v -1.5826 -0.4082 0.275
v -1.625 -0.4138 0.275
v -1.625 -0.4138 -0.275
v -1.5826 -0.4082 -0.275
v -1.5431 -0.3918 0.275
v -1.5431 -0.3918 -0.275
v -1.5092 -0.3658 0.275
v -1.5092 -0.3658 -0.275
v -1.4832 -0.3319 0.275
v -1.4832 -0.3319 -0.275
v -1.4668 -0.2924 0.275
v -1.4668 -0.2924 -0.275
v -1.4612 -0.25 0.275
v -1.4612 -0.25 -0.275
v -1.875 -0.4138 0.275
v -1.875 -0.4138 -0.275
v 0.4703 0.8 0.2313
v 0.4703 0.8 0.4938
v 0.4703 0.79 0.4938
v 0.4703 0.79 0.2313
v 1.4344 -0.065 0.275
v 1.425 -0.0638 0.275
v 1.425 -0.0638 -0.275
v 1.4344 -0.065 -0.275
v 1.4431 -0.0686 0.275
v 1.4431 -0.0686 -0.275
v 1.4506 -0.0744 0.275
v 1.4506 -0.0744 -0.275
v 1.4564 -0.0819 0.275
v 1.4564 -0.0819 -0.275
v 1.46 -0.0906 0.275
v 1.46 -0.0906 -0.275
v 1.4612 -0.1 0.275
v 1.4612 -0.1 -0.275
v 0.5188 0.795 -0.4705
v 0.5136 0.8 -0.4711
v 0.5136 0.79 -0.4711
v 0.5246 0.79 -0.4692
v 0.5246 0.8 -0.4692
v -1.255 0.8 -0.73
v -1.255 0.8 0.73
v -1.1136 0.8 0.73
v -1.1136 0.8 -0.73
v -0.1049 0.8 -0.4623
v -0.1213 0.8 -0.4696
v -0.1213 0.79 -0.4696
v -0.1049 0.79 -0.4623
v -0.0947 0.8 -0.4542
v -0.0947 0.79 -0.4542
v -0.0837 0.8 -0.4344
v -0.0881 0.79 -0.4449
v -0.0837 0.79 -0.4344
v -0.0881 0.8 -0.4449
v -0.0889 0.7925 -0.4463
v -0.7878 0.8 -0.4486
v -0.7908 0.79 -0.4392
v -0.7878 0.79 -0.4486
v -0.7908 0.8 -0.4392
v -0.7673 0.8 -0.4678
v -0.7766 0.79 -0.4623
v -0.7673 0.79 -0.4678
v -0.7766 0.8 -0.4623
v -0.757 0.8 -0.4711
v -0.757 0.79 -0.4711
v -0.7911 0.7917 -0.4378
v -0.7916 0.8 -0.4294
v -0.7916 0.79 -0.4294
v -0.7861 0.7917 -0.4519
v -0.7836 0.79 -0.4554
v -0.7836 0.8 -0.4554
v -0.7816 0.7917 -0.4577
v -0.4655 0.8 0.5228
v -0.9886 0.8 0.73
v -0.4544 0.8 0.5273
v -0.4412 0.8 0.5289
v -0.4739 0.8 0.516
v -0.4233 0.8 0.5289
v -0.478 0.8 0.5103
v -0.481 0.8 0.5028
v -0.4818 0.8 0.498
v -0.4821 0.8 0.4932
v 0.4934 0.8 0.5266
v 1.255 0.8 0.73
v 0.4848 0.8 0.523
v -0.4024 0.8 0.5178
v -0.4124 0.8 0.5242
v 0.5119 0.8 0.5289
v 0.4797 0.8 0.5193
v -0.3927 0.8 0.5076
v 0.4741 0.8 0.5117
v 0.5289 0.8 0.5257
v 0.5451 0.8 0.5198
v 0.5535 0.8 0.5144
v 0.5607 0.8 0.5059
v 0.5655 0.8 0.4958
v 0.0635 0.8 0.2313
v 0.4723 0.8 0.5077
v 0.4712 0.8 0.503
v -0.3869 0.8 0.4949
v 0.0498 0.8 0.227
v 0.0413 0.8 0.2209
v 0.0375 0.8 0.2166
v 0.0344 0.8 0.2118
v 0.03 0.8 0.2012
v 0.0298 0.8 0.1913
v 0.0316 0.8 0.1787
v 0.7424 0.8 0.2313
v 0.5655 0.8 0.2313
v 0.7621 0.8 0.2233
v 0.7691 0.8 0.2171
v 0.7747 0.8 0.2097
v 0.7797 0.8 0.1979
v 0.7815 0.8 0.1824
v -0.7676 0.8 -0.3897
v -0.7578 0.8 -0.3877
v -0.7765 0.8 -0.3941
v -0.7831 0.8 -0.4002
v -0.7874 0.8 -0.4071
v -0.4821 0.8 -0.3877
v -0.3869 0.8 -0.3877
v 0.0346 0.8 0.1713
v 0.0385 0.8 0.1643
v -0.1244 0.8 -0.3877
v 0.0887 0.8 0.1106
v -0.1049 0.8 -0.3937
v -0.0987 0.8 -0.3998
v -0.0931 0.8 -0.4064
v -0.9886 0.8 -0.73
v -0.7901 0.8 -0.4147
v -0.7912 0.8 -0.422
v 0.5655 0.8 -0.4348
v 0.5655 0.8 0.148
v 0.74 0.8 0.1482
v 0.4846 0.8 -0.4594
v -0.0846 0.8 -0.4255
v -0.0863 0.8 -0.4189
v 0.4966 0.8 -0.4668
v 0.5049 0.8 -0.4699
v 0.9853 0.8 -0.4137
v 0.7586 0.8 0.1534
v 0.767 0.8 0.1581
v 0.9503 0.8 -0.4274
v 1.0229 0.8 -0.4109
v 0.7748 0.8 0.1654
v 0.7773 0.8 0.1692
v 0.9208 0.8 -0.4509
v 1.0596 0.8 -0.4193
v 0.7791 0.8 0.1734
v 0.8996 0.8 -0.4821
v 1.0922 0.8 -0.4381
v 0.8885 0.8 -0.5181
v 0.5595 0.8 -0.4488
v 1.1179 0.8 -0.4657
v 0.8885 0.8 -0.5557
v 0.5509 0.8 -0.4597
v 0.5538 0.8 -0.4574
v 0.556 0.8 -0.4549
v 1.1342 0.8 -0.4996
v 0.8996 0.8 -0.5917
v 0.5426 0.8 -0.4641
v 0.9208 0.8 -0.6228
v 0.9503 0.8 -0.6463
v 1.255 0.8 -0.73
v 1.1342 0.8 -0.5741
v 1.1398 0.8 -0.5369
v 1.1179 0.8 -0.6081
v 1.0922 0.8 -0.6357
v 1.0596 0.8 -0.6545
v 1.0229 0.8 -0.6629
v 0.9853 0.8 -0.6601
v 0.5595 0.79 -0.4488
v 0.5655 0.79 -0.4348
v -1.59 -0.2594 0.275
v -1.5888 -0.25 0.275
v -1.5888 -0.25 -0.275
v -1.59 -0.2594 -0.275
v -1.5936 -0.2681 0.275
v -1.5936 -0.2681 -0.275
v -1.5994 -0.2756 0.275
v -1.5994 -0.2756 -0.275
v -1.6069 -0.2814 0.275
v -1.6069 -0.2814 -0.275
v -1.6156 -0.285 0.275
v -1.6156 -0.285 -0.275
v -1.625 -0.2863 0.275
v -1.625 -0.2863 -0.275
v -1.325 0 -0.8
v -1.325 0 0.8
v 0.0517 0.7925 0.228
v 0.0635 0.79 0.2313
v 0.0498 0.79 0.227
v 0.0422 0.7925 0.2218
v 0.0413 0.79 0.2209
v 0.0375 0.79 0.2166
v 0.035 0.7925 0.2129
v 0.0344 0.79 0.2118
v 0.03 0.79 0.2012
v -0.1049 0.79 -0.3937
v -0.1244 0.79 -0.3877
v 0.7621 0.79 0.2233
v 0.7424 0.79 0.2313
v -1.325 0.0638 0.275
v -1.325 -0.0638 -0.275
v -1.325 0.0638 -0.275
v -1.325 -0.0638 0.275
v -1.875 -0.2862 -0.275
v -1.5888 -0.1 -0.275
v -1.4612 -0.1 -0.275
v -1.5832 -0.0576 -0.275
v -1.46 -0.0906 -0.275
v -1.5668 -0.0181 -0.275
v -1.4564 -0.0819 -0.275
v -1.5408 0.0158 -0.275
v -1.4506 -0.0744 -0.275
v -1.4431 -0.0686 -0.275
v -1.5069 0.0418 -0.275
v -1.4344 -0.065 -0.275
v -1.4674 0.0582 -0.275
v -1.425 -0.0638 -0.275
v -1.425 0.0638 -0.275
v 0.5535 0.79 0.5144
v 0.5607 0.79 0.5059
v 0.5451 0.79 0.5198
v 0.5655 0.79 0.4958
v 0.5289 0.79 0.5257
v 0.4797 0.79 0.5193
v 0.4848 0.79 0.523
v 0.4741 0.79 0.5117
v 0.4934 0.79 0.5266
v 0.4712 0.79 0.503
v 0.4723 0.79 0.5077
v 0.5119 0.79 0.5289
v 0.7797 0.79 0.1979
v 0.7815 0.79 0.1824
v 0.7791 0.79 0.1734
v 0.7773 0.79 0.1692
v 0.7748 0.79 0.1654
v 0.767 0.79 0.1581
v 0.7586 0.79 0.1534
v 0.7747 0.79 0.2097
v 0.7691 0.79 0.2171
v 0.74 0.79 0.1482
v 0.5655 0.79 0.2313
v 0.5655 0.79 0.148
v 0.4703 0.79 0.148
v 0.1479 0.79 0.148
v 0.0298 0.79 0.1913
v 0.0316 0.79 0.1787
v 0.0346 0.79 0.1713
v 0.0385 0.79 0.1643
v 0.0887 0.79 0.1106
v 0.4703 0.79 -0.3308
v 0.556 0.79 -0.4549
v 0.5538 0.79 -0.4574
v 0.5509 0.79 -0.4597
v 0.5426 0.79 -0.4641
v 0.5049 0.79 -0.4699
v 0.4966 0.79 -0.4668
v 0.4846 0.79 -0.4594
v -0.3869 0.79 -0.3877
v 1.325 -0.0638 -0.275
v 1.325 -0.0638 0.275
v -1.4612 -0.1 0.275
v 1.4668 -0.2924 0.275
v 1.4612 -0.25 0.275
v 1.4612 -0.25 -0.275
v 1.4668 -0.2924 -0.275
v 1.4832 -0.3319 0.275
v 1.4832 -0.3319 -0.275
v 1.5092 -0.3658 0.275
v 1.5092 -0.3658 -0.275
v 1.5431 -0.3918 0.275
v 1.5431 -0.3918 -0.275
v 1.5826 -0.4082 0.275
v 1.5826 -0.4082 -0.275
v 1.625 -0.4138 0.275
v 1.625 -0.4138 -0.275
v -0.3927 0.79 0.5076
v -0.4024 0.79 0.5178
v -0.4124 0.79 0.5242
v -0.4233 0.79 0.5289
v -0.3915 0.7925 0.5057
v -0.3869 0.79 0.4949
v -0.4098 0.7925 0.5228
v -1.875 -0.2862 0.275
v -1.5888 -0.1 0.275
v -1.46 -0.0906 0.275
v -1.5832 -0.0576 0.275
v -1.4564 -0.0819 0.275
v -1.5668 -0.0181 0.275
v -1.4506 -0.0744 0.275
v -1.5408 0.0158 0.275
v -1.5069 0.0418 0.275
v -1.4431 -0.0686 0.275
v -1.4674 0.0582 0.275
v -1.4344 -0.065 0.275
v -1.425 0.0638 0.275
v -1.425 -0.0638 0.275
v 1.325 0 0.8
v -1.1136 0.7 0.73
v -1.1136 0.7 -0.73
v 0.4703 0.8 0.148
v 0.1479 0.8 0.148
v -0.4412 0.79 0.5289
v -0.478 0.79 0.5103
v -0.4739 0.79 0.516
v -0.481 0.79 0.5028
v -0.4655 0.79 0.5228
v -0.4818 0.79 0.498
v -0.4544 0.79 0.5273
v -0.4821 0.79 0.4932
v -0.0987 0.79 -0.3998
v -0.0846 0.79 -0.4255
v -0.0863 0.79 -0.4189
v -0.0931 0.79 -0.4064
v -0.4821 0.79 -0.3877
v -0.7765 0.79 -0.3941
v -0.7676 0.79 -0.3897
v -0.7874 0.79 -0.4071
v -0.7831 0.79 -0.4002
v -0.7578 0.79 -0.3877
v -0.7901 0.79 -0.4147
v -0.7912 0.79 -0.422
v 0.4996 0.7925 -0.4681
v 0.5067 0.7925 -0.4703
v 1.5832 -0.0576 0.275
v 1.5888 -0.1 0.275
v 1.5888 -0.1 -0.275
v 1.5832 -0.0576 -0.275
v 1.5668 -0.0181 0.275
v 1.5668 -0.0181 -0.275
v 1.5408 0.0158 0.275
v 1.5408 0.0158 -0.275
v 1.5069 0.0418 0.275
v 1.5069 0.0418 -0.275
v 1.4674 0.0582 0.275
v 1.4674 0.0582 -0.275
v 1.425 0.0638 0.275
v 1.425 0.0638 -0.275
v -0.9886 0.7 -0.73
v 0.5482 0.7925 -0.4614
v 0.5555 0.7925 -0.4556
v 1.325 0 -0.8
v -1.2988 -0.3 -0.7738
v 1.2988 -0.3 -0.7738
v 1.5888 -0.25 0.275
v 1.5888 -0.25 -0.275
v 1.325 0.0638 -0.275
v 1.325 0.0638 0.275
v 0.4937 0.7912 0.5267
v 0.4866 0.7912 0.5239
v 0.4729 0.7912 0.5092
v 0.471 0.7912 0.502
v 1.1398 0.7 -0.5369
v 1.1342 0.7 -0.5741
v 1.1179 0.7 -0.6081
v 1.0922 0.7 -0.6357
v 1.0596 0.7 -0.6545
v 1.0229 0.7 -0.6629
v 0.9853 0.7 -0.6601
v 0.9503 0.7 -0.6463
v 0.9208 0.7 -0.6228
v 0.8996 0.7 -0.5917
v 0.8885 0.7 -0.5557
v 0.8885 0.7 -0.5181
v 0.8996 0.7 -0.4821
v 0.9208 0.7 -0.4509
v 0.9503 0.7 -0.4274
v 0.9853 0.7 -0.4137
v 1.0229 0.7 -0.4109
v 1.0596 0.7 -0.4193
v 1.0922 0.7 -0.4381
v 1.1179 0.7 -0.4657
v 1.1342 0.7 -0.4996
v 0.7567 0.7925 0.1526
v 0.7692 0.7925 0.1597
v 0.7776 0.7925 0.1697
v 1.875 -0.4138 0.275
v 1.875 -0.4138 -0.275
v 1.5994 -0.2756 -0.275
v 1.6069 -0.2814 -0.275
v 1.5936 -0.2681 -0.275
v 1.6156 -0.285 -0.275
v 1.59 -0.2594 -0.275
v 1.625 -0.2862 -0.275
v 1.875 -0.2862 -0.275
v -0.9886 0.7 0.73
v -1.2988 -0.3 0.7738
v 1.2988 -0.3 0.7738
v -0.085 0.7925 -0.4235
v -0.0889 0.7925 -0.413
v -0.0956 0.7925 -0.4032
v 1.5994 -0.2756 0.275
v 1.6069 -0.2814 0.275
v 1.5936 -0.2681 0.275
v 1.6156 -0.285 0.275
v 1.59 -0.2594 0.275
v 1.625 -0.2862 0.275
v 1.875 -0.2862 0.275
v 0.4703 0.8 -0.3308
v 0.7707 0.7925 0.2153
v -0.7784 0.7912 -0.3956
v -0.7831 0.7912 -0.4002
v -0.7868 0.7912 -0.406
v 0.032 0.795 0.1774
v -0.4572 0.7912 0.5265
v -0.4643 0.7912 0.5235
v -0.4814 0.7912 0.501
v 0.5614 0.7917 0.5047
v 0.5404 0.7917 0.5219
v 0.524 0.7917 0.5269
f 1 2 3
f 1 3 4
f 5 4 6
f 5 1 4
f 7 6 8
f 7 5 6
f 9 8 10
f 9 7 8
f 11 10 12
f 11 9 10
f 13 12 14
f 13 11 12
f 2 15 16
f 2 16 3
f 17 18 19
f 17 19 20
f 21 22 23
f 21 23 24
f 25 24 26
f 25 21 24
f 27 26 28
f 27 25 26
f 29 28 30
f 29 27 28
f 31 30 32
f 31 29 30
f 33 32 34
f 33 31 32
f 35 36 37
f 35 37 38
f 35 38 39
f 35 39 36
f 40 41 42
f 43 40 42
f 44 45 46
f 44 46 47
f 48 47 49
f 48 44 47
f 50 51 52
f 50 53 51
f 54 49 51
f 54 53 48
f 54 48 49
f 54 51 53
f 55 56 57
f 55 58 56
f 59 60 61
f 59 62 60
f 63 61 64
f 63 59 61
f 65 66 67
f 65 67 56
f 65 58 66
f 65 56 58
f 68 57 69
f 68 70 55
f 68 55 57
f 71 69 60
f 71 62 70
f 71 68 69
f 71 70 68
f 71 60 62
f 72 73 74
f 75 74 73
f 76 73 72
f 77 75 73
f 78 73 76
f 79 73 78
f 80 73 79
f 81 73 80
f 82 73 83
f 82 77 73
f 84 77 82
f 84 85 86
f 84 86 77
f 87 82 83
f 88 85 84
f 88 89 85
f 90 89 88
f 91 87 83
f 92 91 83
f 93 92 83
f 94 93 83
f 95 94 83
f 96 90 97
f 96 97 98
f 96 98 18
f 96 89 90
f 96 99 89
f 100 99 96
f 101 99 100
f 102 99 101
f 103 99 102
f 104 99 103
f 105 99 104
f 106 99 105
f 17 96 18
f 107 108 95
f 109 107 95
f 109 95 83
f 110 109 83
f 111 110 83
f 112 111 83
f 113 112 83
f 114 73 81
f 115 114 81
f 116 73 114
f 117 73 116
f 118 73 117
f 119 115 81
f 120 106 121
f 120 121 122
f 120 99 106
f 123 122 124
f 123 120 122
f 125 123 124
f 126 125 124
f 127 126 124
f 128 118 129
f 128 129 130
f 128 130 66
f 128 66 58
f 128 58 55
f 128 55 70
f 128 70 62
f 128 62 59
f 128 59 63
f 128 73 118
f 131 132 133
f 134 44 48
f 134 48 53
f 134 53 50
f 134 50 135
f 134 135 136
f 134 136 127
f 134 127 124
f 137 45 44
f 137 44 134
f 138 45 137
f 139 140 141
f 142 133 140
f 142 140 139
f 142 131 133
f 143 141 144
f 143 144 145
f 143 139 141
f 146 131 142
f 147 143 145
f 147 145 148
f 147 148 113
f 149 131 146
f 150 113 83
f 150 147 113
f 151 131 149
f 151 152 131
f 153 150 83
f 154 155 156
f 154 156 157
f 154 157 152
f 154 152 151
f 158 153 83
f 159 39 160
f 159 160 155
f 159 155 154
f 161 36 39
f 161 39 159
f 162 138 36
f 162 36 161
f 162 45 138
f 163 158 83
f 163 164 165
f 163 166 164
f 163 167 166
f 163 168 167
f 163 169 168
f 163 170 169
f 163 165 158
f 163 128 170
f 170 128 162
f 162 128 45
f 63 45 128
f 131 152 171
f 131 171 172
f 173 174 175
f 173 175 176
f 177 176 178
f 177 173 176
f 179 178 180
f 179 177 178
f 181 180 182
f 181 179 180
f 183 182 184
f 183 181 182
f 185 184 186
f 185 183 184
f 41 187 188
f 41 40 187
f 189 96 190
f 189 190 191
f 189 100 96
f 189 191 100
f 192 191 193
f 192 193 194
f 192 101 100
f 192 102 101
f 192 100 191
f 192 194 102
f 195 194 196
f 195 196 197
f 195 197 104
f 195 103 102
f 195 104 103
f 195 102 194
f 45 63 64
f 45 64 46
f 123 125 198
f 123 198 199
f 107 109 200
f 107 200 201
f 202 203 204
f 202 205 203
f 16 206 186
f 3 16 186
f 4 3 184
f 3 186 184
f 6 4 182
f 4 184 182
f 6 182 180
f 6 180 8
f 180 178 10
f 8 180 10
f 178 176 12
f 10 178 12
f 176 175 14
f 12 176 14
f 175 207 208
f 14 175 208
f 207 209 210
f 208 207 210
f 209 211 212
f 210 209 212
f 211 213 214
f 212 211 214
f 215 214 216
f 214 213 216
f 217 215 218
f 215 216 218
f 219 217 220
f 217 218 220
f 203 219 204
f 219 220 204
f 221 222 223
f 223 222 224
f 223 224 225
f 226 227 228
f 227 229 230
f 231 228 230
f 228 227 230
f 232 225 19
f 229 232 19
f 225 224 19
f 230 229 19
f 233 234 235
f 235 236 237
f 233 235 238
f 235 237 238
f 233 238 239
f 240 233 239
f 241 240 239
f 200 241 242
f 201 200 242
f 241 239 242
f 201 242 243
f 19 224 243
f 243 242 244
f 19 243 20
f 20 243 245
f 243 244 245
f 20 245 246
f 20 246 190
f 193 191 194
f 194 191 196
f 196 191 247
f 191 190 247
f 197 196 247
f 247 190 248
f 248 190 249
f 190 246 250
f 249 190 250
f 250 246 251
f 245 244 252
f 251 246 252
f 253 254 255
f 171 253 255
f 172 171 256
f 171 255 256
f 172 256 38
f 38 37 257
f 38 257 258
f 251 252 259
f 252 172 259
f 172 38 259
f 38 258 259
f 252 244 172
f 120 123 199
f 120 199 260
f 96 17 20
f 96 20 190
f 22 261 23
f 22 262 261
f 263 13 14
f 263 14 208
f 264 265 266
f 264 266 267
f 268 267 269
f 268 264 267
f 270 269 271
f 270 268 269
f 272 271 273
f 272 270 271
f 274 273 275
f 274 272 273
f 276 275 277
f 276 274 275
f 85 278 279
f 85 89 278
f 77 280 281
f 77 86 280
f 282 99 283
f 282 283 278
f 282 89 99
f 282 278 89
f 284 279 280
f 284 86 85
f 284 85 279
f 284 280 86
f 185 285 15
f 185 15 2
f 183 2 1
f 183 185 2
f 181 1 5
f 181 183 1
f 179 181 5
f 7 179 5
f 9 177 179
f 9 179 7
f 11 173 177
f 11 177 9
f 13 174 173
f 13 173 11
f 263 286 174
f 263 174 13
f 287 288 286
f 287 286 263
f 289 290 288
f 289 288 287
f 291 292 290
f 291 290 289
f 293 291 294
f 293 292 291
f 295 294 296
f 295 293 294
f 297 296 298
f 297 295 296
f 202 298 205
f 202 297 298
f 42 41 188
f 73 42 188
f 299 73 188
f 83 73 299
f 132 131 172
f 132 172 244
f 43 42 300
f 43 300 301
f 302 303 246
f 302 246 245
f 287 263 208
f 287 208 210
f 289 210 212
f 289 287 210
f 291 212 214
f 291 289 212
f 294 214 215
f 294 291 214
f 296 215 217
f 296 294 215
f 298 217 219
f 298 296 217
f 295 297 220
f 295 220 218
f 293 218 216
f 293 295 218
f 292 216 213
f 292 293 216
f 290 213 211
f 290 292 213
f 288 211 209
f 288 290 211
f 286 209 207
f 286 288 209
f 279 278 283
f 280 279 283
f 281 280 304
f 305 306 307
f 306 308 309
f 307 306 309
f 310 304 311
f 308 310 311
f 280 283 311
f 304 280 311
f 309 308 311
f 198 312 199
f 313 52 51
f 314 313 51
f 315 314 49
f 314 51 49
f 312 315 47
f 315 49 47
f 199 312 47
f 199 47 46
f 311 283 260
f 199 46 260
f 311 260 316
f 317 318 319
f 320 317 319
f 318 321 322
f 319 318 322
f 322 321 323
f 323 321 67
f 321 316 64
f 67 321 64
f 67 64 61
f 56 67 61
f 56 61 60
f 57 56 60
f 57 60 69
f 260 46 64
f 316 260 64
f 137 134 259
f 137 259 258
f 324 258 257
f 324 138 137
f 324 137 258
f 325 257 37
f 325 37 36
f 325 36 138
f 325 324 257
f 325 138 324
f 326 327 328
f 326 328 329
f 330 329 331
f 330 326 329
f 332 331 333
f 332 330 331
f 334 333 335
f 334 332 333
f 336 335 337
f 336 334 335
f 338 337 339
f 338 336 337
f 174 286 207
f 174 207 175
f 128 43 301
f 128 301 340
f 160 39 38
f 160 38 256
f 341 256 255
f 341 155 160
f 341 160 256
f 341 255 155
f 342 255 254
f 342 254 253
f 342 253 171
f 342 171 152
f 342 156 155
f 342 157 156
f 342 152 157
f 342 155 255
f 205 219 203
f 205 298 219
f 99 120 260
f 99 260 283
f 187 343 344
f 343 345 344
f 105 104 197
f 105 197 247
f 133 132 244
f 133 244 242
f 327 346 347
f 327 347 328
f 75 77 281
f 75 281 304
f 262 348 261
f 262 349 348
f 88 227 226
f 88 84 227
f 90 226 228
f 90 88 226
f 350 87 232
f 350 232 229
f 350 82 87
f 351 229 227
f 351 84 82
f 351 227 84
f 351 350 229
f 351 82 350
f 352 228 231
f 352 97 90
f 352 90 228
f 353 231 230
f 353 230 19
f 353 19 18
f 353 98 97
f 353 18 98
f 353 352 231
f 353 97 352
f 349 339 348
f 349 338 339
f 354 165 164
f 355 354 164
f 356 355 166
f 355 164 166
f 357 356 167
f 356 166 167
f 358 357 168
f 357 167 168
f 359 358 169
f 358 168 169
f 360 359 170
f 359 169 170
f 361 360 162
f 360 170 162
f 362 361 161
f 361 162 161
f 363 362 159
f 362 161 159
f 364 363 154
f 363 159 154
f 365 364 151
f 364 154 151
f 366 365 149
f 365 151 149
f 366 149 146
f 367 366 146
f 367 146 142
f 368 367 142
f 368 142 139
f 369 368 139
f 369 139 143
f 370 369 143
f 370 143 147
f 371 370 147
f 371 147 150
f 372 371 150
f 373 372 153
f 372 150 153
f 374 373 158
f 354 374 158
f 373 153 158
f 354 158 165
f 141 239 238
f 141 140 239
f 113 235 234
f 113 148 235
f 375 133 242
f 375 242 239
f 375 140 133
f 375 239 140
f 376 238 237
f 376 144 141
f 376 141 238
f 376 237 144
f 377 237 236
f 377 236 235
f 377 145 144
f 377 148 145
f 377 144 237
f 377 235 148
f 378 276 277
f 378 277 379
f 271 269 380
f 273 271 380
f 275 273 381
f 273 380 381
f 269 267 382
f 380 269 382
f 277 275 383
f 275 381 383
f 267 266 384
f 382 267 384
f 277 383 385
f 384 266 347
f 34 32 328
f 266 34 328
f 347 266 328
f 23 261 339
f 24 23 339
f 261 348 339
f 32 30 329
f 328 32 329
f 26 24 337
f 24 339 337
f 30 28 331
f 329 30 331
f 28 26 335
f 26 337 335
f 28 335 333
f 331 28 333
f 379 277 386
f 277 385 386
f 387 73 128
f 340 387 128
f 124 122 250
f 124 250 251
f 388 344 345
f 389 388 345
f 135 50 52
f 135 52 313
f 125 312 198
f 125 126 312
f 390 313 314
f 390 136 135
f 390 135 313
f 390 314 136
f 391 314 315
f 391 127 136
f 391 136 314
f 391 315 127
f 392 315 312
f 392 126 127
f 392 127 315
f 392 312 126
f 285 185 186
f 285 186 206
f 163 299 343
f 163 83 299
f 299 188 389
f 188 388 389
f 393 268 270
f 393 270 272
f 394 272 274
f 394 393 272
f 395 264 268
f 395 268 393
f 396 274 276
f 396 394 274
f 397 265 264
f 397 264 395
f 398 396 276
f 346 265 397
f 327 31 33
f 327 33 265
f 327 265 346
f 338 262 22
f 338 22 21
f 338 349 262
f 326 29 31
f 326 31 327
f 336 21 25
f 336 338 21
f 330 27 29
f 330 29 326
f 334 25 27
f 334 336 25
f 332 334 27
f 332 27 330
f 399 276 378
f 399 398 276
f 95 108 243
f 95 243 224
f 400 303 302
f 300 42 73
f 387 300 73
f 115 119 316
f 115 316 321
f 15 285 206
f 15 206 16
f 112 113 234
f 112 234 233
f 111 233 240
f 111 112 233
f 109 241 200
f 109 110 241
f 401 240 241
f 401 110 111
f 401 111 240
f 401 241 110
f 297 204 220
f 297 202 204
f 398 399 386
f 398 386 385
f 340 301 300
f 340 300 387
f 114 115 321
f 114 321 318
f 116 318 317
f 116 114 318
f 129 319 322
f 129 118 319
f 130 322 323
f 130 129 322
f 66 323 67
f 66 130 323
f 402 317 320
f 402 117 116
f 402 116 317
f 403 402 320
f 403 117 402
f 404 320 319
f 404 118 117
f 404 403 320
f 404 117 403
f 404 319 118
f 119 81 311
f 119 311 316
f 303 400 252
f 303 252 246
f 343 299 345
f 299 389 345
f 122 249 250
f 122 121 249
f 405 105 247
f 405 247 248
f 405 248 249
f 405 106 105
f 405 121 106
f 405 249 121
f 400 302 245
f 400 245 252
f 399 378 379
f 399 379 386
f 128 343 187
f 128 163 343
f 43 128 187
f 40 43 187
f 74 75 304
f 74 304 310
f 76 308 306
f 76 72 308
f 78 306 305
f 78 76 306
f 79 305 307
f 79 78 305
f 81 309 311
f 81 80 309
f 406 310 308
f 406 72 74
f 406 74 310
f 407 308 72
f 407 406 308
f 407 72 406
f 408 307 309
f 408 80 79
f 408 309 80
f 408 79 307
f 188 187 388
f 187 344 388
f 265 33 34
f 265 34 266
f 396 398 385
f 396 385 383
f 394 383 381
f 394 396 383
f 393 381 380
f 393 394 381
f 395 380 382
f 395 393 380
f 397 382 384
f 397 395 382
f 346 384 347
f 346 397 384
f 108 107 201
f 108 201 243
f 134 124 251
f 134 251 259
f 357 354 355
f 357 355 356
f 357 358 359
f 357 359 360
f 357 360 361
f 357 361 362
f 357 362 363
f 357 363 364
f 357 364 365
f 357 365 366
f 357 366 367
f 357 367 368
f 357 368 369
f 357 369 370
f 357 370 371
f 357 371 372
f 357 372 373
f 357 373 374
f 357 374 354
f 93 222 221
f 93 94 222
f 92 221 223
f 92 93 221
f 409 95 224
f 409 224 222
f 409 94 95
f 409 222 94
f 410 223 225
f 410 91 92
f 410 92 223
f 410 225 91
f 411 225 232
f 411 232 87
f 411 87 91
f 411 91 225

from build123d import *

# Parameters (mm, degrees)
SKETCH1_W                     = 2.65
SKETCH1_H                     = 1.6
BOSS_EXTRUDE1_DEPTH           = 0.8
BOSS_EXTRUDE1_TAPER           = 5
BOSS_EXTRUDE1_OTHER_WAY_DEPTH = 0.3
BOSS_EXTRUDE1_OTHER_WAY_TAPER = 5
EXTRUDE_THIN1_DEPTH           = 0.275
EXTRUDE_THIN1_2_DEPTH         = 0.275
CUT_EXTRUDE2_DEPTH            = 0.01
SKETCH5_R                     = 0.126365502
SKETCH5_R_2                   = 0.001365502
SKETCH5_W                     = 0.125
SKETCH5_H                     = 1.460018138
CUT_EXTRUDE_THIN1_DEPTH       = 0.1
CUT_EXTRUDE3_START            = 0.1
SKETCH6_R                     = 0.126365502
CUT_EXTRUDE3_DEPTH            = 0.1


with BuildPart() as part:
    # Sketch1 → Boss-Extrude1 (new body)
    with BuildSketch(Plane(origin=(0, 0, 0), x_dir=(1, 0, 0), z_dir=(0, 1, 0))):
        Rectangle(SKETCH1_W, SKETCH1_H)
    extrude(amount=BOSS_EXTRUDE1_DEPTH, taper=BOSS_EXTRUDE1_TAPER)

    # Sketch1 → Boss-Extrude1 other way (add)
    with BuildSketch(Plane(origin=(0, 0, 0), x_dir=(1, 0, 0), z_dir=(0, 1, 0))):
        Rectangle(SKETCH1_W, SKETCH1_H)
    extrude(amount=-BOSS_EXTRUDE1_OTHER_WAY_DEPTH, taper=BOSS_EXTRUDE1_OTHER_WAY_TAPER)

    # Sketch4 → Cut-Extrude2 (cut)
    # profile 1 of 2: a face of its own
    with BuildSketch(Plane(origin=(0, 0.8, 0), x_dir=(1, 0, 0), z_dir=(0, 1, 0))):
        with BuildLine():
            add(Edge.make_bspline(
                [(-0.121259144, 0.469586956), (-0.116651049, 0.467844685), (-0.107868449, 0.464524077), (-0.096447003, 0.45688116), (-0.088228357, 0.446516989), (-0.08521559, 0.438502857), (-0.083684739, 0.434430706)],
                knots=[0, 0, 0, 0, 1.099088096, 2.094759837, 3.031906972, 4, 4, 4, 4], degree=3))
            add(Edge.make_bspline(
                [(-0.083684739, 0.434430706), (-0.083934775, 0.43073761), (-0.084436505, 0.423326914), (-0.088624873, 0.412581115), (-0.095560362, 0.402540493), (-0.101669699, 0.396747659), (-0.104890096, 0.393694099)],
                knots=[0, 0, 0, 0, 0.933029919, 1.872250689, 2.878405478, 4, 4, 4, 4], degree=3))
            Line((-0.104890096, 0.393694099), (-0.124421346, 0.387741718))
            Line((-0.124421346, 0.387741718), (-0.386884144, 0.387741718))
            Line((-0.386884144, 0.387741718), (-0.386884144, -0.49488477))
            add(Edge.make_bspline(
                [(-0.386884144, -0.49488477), (-0.388226292, -0.49859483), (-0.390942509, -0.506103187), (-0.399133778, -0.515597253), (-0.40998304, -0.523599476), (-0.41870988, -0.527078256), (-0.423342477, -0.528924949)],
                knots=[0, 0, 0, 0, 0.906362302, 1.834280943, 2.850339336, 4, 4, 4, 4], degree=3))
            Line((-0.423342477, -0.528924949), (-0.44119962, -0.528924949))
            add(Edge.make_bspline(
                [(-0.44119962, -0.528924949), (-0.444004378, -0.528847963), (-0.449433668, -0.52869894), (-0.457185821, -0.526675103), (-0.464367422, -0.523841595), (-0.470465169, -0.519397714), (-0.475861843, -0.514357665), (-0.479352362, -0.507937944), (-0.481770348, -0.500885757), (-0.482001809, -0.495837361), (-0.482122239, -0.493210663)],
                knots=[0, 0, 0, 0, 1.101604685, 2.132423317, 3.139528337, 4.122044172, 5.089259853, 6.019369827, 6.969470802, 8, 8, 8, 8], degree=3))
            Line((-0.482122239, -0.493210663), (-0.482122239, 0.387741718))
            Line((-0.482122239, 0.387741718), (-0.757791882, 0.387741718))
            add(Edge.make_bspline(
                [(-0.757791882, 0.387741718), (-0.760480095, 0.388139413), (-0.765599748, 0.388896816), (-0.772640762, 0.391533578), (-0.778512088, 0.39530747), (-0.78335361, 0.400120388), (-0.787028717, 0.406002849), (-0.789960319, 0.412802663), (-0.791300872, 0.420801867), (-0.791526569, 0.426429317), (-0.791646049, 0.429408385)],
                knots=[0, 0, 0, 0, 1.08569211, 2.067680532, 2.983433341, 3.861048676, 4.776801484, 5.744887181, 6.80618505, 8, 8, 8, 8], degree=3))
            add(Edge.make_bspline(
                [(-0.791646049, 0.429408385), (-0.791584577, 0.432216594), (-0.791465245, 0.437668011), (-0.789266612, 0.445222233), (-0.786331556, 0.452128753), (-0.780251927, 0.459630268), (-0.770755063, 0.46725123), (-0.7615821, 0.469810155), (-0.757047834, 0.471075051)],
                knots=[0, 0, 0, 0, 0.852234277, 1.654394119, 2.381606146, 3.12243938, 4.577599788, 6, 6, 6, 6], degree=3))
            Line((-0.757047834, 0.471075051), (-0.121259144, 0.469586956))
        make_face()
    # profile 2 of 2: a face of its own
    with BuildSketch(Plane(origin=(0, 0.8, 0), x_dir=(1, 0, 0), z_dir=(0, 1, 0))):
        with BuildLine():
            Line((0.559544427, 0.448753623), (0.565496808, 0.43480273))
            Line((0.565496808, 0.43480273), (0.565496808, -0.147972568))
            Line((0.565496808, -0.147972568), (0.739975975, -0.14815858))
            add(Edge.make_bspline(
                [(0.739975975, -0.14815858), (0.745651472, -0.149356199), (0.756020301, -0.151544184), (0.769326, -0.158746004), (0.778601366, -0.169323965), (0.780500952, -0.178013221), (0.78145663, -0.18238477)],
                knots=[0, 0, 0, 0, 1.195577152, 2.184255469, 3.086502086, 4, 4, 4, 4], degree=3))
            add(Edge.make_bspline(
                [(0.78145663, -0.18238477), (0.781277252, -0.186567234), (0.780932587, -0.194603608), (0.777289425, -0.205957787), (0.771003906, -0.215812092), (0.765110859, -0.220779207), (0.762111392, -0.223307389)],
                knots=[0, 0, 0, 0, 1.063672196, 2.043787557, 3.004319249, 4, 4, 4, 4], degree=3))
            Line((0.762111392, -0.223307389), (0.74239413, -0.231305901))
            Line((0.74239413, -0.231305901), (0.565496808, -0.231305901))
            Line((0.565496808, -0.231305901), (0.565496808, -0.49581483))
            add(Edge.make_bspline(
                [(0.565496808, -0.49581483), (0.564260881, -0.498858107), (0.561887363, -0.504702527), (0.556262169, -0.51227222), (0.549055395, -0.518201234), (0.538078827, -0.522993434), (0.525678055, -0.526912801), (0.51597471, -0.528332493), (0.51192538, -0.528924949)],
                knots=[0, 0, 0, 0, 0.881479644, 1.692825178, 2.511522639, 3.362763725, 4.899447501, 6, 6, 6, 6], degree=3))
            add(Edge.make_bspline(
                [(0.51192538, -0.528924949), (0.508696109, -0.528823882), (0.502560844, -0.528631867), (0.493970227, -0.527060979), (0.486741308, -0.524145691), (0.480488563, -0.520558484), (0.47603653, -0.515232589), (0.472434762, -0.509147727), (0.470757032, -0.501724154), (0.470429882, -0.496501331), (0.470258713, -0.493768699)],
                knots=[0, 0, 0, 0, 1.244483934, 2.364384402, 3.340480475, 4.242091871, 5.105208837, 5.982430491, 6.944388035, 8, 8, 8, 8], degree=3))
            Line((0.470258713, -0.493768699), (0.470258713, -0.231305901))
            Line((0.470258713, -0.231305901), (0.063450677, -0.231305901))
            add(Edge.make_bspline(
                [(0.063450677, -0.231305901), (0.059452511, -0.230433032), (0.051747591, -0.228750916), (0.041794395, -0.222208098), (0.034174741, -0.212848085), (0.031417793, -0.205195004), (0.029968535, -0.201171972)],
                knots=[0, 0, 0, 0, 1.02115313, 1.96787762, 2.931764676, 4, 4, 4, 4], degree=3))
            Line((0.029968535, -0.201171972), (0.029782523, -0.191313341))
            add(Edge.make_bspline(
                [(0.029782523, -0.191313341), (0.030191147, -0.186555173), (0.031020816, -0.176894221), (0.035998822, -0.168567365), (0.038525082, -0.164341615)],
                knots=[0, 0, 0, 0, 0.985031118, 2, 2, 2, 2], degree=3))
            Line((0.038525082, -0.164341615), (0.088748297, -0.110584175))
            Line((0.088748297, -0.110584175), (0.48458163, 0.459356301))
            add(Edge.make_bspline(
                [(0.48458163, 0.459356301), (0.48706602, 0.461190918), (0.491766311, 0.464661884), (0.499344208, 0.468098846), (0.506495116, 0.470623481), (0.511285948, 0.470927998), (0.513599487, 0.471075051)],
                knots=[0, 0, 0, 0, 1.161393316, 2.197273816, 3.129445936, 4, 4, 4, 4], degree=3))
            add(Edge.make_bspline(
                [(0.513599487, 0.471075051), (0.515343337, 0.470935685), (0.519055223, 0.470639034), (0.522661923, 0.46970837), (0.524574189, 0.469214932)],
                knots=[0, 0, 0, 0, 0.939603003, 2, 2, 2, 2], degree=3))
            add(Edge.make_bspline(
                [(0.524574189, 0.469214932), (0.529087337, 0.468250248), (0.537249654, 0.466505554), (0.547784131, 0.462076394), (0.555743649, 0.456398213), (0.558340638, 0.45117483), (0.559544427, 0.448753623)],
                knots=[0, 0, 0, 0, 1.307248616, 2.364243258, 3.241773542, 4, 4, 4, 4], degree=3))
        make_face()
        Polygon((0.147900082, -0.147972568), (0.470258713, -0.147972568), (0.470258713, 0.330822075), align=None, mode=Mode.SUBTRACT)
    extrude(amount=-CUT_EXTRUDE2_DEPTH, mode=Mode.SUBTRACT)

    # Sketch5 → Cut-Extrude-Thin1 (cut)
    # profile 1 of 2: a face of its own
    with BuildSketch(Plane(origin=(0, 0.8, 0), x_dir=(1, 0, 0), z_dir=(0, 1, 0))):
        with Locations((1.013457904, 0.536885562)):
            Circle(SKETCH5_R)
        with Locations((1.013457904, 0.536885562)):
            Circle(SKETCH5_R_2, mode=Mode.SUBTRACT)
    # profile 2 of 2: a face of its own
    with BuildSketch(Plane(origin=(0, 0.8, 0), x_dir=(1, 0, 0), z_dir=(0, 1, 0))):
        with Locations((-1.051097793, 0)):
            Rectangle(SKETCH5_W, SKETCH5_H)
    extrude(amount=-CUT_EXTRUDE_THIN1_DEPTH, mode=Mode.SUBTRACT)

    # Sketch6 → Cut-Extrude3 (cut)
    with BuildSketch(Plane(origin=(0, 0.7, 0), x_dir=(1, 0, 0), z_dir=(0, 1, 0)).offset(CUT_EXTRUDE3_START)):
        with Locations((1.013457904, 0.536885562)):
            Circle(SKETCH6_R)
    extrude(amount=-CUT_EXTRUDE3_DEPTH, mode=Mode.SUBTRACT)


with BuildPart() as body_2:
    # Sketch3 → Extrude-Thin1 (new, symmetric)
    with BuildSketch(Plane.XY):
        with BuildLine():
            Line((-1.325, 0.06375), (-1.425, 0.06375))
            ThreePointArc((-1.425, 0.06375), (-1.540788735, 0.015788735), (-1.58875, -0.1))
            Line((-1.58875, -0.1), (-1.58875, -0.25))
            ThreePointArc((-1.58875, -0.25), (-1.599367379, -0.275632621), (-1.625, -0.28625))
            Line((-1.625, -0.28625), (-1.875, -0.28625))
            Line((-1.875, -0.28625), (-1.875, -0.41375))
            Line((-1.875, -0.41375), (-1.625, -0.41375))
            ThreePointArc((-1.625, -0.41375), (-1.509211265, -0.365788735), (-1.46125, -0.25))
            Line((-1.46125, -0.25), (-1.46125, -0.1))
            ThreePointArc((-1.46125, -0.1), (-1.450632621, -0.074367379), (-1.425, -0.06375))
            Line((-1.425, -0.06375), (-1.325, -0.06375))
            Line((-1.325, -0.06375), (-1.325, 0.06375))
        make_face()
    extrude(amount=EXTRUDE_THIN1_DEPTH, both=True)


with BuildPart() as body_3:
    # Sketch3 → Extrude-Thin1 2 (new, symmetric)
    with BuildSketch(Plane.XY):
        with BuildLine():
            Line((1.325, -0.06375), (1.425, -0.06375))
            ThreePointArc((1.425, -0.06375), (1.450632621, -0.074367379), (1.46125, -0.1))
            Line((1.46125, -0.1), (1.46125, -0.25))
            ThreePointArc((1.46125, -0.25), (1.509211265, -0.365788735), (1.625, -0.41375))
            Line((1.625, -0.41375), (1.875, -0.41375))
            Line((1.875, -0.41375), (1.875, -0.28625))
            Line((1.875, -0.28625), (1.625, -0.28625))
            ThreePointArc((1.625, -0.28625), (1.599367379, -0.275632621), (1.58875, -0.25))
            Line((1.58875, -0.25), (1.58875, -0.1))
            ThreePointArc((1.58875, -0.1), (1.540788735, 0.015788735), (1.425, 0.06375))
            Line((1.425, 0.06375), (1.325, 0.06375))
            Line((1.325, 0.06375), (1.325, -0.06375))
        make_face()
    extrude(amount=EXTRUDE_THIN1_2_DEPTH, both=True)


solid = Compound([part.part, body_2.part, body_3.part])
